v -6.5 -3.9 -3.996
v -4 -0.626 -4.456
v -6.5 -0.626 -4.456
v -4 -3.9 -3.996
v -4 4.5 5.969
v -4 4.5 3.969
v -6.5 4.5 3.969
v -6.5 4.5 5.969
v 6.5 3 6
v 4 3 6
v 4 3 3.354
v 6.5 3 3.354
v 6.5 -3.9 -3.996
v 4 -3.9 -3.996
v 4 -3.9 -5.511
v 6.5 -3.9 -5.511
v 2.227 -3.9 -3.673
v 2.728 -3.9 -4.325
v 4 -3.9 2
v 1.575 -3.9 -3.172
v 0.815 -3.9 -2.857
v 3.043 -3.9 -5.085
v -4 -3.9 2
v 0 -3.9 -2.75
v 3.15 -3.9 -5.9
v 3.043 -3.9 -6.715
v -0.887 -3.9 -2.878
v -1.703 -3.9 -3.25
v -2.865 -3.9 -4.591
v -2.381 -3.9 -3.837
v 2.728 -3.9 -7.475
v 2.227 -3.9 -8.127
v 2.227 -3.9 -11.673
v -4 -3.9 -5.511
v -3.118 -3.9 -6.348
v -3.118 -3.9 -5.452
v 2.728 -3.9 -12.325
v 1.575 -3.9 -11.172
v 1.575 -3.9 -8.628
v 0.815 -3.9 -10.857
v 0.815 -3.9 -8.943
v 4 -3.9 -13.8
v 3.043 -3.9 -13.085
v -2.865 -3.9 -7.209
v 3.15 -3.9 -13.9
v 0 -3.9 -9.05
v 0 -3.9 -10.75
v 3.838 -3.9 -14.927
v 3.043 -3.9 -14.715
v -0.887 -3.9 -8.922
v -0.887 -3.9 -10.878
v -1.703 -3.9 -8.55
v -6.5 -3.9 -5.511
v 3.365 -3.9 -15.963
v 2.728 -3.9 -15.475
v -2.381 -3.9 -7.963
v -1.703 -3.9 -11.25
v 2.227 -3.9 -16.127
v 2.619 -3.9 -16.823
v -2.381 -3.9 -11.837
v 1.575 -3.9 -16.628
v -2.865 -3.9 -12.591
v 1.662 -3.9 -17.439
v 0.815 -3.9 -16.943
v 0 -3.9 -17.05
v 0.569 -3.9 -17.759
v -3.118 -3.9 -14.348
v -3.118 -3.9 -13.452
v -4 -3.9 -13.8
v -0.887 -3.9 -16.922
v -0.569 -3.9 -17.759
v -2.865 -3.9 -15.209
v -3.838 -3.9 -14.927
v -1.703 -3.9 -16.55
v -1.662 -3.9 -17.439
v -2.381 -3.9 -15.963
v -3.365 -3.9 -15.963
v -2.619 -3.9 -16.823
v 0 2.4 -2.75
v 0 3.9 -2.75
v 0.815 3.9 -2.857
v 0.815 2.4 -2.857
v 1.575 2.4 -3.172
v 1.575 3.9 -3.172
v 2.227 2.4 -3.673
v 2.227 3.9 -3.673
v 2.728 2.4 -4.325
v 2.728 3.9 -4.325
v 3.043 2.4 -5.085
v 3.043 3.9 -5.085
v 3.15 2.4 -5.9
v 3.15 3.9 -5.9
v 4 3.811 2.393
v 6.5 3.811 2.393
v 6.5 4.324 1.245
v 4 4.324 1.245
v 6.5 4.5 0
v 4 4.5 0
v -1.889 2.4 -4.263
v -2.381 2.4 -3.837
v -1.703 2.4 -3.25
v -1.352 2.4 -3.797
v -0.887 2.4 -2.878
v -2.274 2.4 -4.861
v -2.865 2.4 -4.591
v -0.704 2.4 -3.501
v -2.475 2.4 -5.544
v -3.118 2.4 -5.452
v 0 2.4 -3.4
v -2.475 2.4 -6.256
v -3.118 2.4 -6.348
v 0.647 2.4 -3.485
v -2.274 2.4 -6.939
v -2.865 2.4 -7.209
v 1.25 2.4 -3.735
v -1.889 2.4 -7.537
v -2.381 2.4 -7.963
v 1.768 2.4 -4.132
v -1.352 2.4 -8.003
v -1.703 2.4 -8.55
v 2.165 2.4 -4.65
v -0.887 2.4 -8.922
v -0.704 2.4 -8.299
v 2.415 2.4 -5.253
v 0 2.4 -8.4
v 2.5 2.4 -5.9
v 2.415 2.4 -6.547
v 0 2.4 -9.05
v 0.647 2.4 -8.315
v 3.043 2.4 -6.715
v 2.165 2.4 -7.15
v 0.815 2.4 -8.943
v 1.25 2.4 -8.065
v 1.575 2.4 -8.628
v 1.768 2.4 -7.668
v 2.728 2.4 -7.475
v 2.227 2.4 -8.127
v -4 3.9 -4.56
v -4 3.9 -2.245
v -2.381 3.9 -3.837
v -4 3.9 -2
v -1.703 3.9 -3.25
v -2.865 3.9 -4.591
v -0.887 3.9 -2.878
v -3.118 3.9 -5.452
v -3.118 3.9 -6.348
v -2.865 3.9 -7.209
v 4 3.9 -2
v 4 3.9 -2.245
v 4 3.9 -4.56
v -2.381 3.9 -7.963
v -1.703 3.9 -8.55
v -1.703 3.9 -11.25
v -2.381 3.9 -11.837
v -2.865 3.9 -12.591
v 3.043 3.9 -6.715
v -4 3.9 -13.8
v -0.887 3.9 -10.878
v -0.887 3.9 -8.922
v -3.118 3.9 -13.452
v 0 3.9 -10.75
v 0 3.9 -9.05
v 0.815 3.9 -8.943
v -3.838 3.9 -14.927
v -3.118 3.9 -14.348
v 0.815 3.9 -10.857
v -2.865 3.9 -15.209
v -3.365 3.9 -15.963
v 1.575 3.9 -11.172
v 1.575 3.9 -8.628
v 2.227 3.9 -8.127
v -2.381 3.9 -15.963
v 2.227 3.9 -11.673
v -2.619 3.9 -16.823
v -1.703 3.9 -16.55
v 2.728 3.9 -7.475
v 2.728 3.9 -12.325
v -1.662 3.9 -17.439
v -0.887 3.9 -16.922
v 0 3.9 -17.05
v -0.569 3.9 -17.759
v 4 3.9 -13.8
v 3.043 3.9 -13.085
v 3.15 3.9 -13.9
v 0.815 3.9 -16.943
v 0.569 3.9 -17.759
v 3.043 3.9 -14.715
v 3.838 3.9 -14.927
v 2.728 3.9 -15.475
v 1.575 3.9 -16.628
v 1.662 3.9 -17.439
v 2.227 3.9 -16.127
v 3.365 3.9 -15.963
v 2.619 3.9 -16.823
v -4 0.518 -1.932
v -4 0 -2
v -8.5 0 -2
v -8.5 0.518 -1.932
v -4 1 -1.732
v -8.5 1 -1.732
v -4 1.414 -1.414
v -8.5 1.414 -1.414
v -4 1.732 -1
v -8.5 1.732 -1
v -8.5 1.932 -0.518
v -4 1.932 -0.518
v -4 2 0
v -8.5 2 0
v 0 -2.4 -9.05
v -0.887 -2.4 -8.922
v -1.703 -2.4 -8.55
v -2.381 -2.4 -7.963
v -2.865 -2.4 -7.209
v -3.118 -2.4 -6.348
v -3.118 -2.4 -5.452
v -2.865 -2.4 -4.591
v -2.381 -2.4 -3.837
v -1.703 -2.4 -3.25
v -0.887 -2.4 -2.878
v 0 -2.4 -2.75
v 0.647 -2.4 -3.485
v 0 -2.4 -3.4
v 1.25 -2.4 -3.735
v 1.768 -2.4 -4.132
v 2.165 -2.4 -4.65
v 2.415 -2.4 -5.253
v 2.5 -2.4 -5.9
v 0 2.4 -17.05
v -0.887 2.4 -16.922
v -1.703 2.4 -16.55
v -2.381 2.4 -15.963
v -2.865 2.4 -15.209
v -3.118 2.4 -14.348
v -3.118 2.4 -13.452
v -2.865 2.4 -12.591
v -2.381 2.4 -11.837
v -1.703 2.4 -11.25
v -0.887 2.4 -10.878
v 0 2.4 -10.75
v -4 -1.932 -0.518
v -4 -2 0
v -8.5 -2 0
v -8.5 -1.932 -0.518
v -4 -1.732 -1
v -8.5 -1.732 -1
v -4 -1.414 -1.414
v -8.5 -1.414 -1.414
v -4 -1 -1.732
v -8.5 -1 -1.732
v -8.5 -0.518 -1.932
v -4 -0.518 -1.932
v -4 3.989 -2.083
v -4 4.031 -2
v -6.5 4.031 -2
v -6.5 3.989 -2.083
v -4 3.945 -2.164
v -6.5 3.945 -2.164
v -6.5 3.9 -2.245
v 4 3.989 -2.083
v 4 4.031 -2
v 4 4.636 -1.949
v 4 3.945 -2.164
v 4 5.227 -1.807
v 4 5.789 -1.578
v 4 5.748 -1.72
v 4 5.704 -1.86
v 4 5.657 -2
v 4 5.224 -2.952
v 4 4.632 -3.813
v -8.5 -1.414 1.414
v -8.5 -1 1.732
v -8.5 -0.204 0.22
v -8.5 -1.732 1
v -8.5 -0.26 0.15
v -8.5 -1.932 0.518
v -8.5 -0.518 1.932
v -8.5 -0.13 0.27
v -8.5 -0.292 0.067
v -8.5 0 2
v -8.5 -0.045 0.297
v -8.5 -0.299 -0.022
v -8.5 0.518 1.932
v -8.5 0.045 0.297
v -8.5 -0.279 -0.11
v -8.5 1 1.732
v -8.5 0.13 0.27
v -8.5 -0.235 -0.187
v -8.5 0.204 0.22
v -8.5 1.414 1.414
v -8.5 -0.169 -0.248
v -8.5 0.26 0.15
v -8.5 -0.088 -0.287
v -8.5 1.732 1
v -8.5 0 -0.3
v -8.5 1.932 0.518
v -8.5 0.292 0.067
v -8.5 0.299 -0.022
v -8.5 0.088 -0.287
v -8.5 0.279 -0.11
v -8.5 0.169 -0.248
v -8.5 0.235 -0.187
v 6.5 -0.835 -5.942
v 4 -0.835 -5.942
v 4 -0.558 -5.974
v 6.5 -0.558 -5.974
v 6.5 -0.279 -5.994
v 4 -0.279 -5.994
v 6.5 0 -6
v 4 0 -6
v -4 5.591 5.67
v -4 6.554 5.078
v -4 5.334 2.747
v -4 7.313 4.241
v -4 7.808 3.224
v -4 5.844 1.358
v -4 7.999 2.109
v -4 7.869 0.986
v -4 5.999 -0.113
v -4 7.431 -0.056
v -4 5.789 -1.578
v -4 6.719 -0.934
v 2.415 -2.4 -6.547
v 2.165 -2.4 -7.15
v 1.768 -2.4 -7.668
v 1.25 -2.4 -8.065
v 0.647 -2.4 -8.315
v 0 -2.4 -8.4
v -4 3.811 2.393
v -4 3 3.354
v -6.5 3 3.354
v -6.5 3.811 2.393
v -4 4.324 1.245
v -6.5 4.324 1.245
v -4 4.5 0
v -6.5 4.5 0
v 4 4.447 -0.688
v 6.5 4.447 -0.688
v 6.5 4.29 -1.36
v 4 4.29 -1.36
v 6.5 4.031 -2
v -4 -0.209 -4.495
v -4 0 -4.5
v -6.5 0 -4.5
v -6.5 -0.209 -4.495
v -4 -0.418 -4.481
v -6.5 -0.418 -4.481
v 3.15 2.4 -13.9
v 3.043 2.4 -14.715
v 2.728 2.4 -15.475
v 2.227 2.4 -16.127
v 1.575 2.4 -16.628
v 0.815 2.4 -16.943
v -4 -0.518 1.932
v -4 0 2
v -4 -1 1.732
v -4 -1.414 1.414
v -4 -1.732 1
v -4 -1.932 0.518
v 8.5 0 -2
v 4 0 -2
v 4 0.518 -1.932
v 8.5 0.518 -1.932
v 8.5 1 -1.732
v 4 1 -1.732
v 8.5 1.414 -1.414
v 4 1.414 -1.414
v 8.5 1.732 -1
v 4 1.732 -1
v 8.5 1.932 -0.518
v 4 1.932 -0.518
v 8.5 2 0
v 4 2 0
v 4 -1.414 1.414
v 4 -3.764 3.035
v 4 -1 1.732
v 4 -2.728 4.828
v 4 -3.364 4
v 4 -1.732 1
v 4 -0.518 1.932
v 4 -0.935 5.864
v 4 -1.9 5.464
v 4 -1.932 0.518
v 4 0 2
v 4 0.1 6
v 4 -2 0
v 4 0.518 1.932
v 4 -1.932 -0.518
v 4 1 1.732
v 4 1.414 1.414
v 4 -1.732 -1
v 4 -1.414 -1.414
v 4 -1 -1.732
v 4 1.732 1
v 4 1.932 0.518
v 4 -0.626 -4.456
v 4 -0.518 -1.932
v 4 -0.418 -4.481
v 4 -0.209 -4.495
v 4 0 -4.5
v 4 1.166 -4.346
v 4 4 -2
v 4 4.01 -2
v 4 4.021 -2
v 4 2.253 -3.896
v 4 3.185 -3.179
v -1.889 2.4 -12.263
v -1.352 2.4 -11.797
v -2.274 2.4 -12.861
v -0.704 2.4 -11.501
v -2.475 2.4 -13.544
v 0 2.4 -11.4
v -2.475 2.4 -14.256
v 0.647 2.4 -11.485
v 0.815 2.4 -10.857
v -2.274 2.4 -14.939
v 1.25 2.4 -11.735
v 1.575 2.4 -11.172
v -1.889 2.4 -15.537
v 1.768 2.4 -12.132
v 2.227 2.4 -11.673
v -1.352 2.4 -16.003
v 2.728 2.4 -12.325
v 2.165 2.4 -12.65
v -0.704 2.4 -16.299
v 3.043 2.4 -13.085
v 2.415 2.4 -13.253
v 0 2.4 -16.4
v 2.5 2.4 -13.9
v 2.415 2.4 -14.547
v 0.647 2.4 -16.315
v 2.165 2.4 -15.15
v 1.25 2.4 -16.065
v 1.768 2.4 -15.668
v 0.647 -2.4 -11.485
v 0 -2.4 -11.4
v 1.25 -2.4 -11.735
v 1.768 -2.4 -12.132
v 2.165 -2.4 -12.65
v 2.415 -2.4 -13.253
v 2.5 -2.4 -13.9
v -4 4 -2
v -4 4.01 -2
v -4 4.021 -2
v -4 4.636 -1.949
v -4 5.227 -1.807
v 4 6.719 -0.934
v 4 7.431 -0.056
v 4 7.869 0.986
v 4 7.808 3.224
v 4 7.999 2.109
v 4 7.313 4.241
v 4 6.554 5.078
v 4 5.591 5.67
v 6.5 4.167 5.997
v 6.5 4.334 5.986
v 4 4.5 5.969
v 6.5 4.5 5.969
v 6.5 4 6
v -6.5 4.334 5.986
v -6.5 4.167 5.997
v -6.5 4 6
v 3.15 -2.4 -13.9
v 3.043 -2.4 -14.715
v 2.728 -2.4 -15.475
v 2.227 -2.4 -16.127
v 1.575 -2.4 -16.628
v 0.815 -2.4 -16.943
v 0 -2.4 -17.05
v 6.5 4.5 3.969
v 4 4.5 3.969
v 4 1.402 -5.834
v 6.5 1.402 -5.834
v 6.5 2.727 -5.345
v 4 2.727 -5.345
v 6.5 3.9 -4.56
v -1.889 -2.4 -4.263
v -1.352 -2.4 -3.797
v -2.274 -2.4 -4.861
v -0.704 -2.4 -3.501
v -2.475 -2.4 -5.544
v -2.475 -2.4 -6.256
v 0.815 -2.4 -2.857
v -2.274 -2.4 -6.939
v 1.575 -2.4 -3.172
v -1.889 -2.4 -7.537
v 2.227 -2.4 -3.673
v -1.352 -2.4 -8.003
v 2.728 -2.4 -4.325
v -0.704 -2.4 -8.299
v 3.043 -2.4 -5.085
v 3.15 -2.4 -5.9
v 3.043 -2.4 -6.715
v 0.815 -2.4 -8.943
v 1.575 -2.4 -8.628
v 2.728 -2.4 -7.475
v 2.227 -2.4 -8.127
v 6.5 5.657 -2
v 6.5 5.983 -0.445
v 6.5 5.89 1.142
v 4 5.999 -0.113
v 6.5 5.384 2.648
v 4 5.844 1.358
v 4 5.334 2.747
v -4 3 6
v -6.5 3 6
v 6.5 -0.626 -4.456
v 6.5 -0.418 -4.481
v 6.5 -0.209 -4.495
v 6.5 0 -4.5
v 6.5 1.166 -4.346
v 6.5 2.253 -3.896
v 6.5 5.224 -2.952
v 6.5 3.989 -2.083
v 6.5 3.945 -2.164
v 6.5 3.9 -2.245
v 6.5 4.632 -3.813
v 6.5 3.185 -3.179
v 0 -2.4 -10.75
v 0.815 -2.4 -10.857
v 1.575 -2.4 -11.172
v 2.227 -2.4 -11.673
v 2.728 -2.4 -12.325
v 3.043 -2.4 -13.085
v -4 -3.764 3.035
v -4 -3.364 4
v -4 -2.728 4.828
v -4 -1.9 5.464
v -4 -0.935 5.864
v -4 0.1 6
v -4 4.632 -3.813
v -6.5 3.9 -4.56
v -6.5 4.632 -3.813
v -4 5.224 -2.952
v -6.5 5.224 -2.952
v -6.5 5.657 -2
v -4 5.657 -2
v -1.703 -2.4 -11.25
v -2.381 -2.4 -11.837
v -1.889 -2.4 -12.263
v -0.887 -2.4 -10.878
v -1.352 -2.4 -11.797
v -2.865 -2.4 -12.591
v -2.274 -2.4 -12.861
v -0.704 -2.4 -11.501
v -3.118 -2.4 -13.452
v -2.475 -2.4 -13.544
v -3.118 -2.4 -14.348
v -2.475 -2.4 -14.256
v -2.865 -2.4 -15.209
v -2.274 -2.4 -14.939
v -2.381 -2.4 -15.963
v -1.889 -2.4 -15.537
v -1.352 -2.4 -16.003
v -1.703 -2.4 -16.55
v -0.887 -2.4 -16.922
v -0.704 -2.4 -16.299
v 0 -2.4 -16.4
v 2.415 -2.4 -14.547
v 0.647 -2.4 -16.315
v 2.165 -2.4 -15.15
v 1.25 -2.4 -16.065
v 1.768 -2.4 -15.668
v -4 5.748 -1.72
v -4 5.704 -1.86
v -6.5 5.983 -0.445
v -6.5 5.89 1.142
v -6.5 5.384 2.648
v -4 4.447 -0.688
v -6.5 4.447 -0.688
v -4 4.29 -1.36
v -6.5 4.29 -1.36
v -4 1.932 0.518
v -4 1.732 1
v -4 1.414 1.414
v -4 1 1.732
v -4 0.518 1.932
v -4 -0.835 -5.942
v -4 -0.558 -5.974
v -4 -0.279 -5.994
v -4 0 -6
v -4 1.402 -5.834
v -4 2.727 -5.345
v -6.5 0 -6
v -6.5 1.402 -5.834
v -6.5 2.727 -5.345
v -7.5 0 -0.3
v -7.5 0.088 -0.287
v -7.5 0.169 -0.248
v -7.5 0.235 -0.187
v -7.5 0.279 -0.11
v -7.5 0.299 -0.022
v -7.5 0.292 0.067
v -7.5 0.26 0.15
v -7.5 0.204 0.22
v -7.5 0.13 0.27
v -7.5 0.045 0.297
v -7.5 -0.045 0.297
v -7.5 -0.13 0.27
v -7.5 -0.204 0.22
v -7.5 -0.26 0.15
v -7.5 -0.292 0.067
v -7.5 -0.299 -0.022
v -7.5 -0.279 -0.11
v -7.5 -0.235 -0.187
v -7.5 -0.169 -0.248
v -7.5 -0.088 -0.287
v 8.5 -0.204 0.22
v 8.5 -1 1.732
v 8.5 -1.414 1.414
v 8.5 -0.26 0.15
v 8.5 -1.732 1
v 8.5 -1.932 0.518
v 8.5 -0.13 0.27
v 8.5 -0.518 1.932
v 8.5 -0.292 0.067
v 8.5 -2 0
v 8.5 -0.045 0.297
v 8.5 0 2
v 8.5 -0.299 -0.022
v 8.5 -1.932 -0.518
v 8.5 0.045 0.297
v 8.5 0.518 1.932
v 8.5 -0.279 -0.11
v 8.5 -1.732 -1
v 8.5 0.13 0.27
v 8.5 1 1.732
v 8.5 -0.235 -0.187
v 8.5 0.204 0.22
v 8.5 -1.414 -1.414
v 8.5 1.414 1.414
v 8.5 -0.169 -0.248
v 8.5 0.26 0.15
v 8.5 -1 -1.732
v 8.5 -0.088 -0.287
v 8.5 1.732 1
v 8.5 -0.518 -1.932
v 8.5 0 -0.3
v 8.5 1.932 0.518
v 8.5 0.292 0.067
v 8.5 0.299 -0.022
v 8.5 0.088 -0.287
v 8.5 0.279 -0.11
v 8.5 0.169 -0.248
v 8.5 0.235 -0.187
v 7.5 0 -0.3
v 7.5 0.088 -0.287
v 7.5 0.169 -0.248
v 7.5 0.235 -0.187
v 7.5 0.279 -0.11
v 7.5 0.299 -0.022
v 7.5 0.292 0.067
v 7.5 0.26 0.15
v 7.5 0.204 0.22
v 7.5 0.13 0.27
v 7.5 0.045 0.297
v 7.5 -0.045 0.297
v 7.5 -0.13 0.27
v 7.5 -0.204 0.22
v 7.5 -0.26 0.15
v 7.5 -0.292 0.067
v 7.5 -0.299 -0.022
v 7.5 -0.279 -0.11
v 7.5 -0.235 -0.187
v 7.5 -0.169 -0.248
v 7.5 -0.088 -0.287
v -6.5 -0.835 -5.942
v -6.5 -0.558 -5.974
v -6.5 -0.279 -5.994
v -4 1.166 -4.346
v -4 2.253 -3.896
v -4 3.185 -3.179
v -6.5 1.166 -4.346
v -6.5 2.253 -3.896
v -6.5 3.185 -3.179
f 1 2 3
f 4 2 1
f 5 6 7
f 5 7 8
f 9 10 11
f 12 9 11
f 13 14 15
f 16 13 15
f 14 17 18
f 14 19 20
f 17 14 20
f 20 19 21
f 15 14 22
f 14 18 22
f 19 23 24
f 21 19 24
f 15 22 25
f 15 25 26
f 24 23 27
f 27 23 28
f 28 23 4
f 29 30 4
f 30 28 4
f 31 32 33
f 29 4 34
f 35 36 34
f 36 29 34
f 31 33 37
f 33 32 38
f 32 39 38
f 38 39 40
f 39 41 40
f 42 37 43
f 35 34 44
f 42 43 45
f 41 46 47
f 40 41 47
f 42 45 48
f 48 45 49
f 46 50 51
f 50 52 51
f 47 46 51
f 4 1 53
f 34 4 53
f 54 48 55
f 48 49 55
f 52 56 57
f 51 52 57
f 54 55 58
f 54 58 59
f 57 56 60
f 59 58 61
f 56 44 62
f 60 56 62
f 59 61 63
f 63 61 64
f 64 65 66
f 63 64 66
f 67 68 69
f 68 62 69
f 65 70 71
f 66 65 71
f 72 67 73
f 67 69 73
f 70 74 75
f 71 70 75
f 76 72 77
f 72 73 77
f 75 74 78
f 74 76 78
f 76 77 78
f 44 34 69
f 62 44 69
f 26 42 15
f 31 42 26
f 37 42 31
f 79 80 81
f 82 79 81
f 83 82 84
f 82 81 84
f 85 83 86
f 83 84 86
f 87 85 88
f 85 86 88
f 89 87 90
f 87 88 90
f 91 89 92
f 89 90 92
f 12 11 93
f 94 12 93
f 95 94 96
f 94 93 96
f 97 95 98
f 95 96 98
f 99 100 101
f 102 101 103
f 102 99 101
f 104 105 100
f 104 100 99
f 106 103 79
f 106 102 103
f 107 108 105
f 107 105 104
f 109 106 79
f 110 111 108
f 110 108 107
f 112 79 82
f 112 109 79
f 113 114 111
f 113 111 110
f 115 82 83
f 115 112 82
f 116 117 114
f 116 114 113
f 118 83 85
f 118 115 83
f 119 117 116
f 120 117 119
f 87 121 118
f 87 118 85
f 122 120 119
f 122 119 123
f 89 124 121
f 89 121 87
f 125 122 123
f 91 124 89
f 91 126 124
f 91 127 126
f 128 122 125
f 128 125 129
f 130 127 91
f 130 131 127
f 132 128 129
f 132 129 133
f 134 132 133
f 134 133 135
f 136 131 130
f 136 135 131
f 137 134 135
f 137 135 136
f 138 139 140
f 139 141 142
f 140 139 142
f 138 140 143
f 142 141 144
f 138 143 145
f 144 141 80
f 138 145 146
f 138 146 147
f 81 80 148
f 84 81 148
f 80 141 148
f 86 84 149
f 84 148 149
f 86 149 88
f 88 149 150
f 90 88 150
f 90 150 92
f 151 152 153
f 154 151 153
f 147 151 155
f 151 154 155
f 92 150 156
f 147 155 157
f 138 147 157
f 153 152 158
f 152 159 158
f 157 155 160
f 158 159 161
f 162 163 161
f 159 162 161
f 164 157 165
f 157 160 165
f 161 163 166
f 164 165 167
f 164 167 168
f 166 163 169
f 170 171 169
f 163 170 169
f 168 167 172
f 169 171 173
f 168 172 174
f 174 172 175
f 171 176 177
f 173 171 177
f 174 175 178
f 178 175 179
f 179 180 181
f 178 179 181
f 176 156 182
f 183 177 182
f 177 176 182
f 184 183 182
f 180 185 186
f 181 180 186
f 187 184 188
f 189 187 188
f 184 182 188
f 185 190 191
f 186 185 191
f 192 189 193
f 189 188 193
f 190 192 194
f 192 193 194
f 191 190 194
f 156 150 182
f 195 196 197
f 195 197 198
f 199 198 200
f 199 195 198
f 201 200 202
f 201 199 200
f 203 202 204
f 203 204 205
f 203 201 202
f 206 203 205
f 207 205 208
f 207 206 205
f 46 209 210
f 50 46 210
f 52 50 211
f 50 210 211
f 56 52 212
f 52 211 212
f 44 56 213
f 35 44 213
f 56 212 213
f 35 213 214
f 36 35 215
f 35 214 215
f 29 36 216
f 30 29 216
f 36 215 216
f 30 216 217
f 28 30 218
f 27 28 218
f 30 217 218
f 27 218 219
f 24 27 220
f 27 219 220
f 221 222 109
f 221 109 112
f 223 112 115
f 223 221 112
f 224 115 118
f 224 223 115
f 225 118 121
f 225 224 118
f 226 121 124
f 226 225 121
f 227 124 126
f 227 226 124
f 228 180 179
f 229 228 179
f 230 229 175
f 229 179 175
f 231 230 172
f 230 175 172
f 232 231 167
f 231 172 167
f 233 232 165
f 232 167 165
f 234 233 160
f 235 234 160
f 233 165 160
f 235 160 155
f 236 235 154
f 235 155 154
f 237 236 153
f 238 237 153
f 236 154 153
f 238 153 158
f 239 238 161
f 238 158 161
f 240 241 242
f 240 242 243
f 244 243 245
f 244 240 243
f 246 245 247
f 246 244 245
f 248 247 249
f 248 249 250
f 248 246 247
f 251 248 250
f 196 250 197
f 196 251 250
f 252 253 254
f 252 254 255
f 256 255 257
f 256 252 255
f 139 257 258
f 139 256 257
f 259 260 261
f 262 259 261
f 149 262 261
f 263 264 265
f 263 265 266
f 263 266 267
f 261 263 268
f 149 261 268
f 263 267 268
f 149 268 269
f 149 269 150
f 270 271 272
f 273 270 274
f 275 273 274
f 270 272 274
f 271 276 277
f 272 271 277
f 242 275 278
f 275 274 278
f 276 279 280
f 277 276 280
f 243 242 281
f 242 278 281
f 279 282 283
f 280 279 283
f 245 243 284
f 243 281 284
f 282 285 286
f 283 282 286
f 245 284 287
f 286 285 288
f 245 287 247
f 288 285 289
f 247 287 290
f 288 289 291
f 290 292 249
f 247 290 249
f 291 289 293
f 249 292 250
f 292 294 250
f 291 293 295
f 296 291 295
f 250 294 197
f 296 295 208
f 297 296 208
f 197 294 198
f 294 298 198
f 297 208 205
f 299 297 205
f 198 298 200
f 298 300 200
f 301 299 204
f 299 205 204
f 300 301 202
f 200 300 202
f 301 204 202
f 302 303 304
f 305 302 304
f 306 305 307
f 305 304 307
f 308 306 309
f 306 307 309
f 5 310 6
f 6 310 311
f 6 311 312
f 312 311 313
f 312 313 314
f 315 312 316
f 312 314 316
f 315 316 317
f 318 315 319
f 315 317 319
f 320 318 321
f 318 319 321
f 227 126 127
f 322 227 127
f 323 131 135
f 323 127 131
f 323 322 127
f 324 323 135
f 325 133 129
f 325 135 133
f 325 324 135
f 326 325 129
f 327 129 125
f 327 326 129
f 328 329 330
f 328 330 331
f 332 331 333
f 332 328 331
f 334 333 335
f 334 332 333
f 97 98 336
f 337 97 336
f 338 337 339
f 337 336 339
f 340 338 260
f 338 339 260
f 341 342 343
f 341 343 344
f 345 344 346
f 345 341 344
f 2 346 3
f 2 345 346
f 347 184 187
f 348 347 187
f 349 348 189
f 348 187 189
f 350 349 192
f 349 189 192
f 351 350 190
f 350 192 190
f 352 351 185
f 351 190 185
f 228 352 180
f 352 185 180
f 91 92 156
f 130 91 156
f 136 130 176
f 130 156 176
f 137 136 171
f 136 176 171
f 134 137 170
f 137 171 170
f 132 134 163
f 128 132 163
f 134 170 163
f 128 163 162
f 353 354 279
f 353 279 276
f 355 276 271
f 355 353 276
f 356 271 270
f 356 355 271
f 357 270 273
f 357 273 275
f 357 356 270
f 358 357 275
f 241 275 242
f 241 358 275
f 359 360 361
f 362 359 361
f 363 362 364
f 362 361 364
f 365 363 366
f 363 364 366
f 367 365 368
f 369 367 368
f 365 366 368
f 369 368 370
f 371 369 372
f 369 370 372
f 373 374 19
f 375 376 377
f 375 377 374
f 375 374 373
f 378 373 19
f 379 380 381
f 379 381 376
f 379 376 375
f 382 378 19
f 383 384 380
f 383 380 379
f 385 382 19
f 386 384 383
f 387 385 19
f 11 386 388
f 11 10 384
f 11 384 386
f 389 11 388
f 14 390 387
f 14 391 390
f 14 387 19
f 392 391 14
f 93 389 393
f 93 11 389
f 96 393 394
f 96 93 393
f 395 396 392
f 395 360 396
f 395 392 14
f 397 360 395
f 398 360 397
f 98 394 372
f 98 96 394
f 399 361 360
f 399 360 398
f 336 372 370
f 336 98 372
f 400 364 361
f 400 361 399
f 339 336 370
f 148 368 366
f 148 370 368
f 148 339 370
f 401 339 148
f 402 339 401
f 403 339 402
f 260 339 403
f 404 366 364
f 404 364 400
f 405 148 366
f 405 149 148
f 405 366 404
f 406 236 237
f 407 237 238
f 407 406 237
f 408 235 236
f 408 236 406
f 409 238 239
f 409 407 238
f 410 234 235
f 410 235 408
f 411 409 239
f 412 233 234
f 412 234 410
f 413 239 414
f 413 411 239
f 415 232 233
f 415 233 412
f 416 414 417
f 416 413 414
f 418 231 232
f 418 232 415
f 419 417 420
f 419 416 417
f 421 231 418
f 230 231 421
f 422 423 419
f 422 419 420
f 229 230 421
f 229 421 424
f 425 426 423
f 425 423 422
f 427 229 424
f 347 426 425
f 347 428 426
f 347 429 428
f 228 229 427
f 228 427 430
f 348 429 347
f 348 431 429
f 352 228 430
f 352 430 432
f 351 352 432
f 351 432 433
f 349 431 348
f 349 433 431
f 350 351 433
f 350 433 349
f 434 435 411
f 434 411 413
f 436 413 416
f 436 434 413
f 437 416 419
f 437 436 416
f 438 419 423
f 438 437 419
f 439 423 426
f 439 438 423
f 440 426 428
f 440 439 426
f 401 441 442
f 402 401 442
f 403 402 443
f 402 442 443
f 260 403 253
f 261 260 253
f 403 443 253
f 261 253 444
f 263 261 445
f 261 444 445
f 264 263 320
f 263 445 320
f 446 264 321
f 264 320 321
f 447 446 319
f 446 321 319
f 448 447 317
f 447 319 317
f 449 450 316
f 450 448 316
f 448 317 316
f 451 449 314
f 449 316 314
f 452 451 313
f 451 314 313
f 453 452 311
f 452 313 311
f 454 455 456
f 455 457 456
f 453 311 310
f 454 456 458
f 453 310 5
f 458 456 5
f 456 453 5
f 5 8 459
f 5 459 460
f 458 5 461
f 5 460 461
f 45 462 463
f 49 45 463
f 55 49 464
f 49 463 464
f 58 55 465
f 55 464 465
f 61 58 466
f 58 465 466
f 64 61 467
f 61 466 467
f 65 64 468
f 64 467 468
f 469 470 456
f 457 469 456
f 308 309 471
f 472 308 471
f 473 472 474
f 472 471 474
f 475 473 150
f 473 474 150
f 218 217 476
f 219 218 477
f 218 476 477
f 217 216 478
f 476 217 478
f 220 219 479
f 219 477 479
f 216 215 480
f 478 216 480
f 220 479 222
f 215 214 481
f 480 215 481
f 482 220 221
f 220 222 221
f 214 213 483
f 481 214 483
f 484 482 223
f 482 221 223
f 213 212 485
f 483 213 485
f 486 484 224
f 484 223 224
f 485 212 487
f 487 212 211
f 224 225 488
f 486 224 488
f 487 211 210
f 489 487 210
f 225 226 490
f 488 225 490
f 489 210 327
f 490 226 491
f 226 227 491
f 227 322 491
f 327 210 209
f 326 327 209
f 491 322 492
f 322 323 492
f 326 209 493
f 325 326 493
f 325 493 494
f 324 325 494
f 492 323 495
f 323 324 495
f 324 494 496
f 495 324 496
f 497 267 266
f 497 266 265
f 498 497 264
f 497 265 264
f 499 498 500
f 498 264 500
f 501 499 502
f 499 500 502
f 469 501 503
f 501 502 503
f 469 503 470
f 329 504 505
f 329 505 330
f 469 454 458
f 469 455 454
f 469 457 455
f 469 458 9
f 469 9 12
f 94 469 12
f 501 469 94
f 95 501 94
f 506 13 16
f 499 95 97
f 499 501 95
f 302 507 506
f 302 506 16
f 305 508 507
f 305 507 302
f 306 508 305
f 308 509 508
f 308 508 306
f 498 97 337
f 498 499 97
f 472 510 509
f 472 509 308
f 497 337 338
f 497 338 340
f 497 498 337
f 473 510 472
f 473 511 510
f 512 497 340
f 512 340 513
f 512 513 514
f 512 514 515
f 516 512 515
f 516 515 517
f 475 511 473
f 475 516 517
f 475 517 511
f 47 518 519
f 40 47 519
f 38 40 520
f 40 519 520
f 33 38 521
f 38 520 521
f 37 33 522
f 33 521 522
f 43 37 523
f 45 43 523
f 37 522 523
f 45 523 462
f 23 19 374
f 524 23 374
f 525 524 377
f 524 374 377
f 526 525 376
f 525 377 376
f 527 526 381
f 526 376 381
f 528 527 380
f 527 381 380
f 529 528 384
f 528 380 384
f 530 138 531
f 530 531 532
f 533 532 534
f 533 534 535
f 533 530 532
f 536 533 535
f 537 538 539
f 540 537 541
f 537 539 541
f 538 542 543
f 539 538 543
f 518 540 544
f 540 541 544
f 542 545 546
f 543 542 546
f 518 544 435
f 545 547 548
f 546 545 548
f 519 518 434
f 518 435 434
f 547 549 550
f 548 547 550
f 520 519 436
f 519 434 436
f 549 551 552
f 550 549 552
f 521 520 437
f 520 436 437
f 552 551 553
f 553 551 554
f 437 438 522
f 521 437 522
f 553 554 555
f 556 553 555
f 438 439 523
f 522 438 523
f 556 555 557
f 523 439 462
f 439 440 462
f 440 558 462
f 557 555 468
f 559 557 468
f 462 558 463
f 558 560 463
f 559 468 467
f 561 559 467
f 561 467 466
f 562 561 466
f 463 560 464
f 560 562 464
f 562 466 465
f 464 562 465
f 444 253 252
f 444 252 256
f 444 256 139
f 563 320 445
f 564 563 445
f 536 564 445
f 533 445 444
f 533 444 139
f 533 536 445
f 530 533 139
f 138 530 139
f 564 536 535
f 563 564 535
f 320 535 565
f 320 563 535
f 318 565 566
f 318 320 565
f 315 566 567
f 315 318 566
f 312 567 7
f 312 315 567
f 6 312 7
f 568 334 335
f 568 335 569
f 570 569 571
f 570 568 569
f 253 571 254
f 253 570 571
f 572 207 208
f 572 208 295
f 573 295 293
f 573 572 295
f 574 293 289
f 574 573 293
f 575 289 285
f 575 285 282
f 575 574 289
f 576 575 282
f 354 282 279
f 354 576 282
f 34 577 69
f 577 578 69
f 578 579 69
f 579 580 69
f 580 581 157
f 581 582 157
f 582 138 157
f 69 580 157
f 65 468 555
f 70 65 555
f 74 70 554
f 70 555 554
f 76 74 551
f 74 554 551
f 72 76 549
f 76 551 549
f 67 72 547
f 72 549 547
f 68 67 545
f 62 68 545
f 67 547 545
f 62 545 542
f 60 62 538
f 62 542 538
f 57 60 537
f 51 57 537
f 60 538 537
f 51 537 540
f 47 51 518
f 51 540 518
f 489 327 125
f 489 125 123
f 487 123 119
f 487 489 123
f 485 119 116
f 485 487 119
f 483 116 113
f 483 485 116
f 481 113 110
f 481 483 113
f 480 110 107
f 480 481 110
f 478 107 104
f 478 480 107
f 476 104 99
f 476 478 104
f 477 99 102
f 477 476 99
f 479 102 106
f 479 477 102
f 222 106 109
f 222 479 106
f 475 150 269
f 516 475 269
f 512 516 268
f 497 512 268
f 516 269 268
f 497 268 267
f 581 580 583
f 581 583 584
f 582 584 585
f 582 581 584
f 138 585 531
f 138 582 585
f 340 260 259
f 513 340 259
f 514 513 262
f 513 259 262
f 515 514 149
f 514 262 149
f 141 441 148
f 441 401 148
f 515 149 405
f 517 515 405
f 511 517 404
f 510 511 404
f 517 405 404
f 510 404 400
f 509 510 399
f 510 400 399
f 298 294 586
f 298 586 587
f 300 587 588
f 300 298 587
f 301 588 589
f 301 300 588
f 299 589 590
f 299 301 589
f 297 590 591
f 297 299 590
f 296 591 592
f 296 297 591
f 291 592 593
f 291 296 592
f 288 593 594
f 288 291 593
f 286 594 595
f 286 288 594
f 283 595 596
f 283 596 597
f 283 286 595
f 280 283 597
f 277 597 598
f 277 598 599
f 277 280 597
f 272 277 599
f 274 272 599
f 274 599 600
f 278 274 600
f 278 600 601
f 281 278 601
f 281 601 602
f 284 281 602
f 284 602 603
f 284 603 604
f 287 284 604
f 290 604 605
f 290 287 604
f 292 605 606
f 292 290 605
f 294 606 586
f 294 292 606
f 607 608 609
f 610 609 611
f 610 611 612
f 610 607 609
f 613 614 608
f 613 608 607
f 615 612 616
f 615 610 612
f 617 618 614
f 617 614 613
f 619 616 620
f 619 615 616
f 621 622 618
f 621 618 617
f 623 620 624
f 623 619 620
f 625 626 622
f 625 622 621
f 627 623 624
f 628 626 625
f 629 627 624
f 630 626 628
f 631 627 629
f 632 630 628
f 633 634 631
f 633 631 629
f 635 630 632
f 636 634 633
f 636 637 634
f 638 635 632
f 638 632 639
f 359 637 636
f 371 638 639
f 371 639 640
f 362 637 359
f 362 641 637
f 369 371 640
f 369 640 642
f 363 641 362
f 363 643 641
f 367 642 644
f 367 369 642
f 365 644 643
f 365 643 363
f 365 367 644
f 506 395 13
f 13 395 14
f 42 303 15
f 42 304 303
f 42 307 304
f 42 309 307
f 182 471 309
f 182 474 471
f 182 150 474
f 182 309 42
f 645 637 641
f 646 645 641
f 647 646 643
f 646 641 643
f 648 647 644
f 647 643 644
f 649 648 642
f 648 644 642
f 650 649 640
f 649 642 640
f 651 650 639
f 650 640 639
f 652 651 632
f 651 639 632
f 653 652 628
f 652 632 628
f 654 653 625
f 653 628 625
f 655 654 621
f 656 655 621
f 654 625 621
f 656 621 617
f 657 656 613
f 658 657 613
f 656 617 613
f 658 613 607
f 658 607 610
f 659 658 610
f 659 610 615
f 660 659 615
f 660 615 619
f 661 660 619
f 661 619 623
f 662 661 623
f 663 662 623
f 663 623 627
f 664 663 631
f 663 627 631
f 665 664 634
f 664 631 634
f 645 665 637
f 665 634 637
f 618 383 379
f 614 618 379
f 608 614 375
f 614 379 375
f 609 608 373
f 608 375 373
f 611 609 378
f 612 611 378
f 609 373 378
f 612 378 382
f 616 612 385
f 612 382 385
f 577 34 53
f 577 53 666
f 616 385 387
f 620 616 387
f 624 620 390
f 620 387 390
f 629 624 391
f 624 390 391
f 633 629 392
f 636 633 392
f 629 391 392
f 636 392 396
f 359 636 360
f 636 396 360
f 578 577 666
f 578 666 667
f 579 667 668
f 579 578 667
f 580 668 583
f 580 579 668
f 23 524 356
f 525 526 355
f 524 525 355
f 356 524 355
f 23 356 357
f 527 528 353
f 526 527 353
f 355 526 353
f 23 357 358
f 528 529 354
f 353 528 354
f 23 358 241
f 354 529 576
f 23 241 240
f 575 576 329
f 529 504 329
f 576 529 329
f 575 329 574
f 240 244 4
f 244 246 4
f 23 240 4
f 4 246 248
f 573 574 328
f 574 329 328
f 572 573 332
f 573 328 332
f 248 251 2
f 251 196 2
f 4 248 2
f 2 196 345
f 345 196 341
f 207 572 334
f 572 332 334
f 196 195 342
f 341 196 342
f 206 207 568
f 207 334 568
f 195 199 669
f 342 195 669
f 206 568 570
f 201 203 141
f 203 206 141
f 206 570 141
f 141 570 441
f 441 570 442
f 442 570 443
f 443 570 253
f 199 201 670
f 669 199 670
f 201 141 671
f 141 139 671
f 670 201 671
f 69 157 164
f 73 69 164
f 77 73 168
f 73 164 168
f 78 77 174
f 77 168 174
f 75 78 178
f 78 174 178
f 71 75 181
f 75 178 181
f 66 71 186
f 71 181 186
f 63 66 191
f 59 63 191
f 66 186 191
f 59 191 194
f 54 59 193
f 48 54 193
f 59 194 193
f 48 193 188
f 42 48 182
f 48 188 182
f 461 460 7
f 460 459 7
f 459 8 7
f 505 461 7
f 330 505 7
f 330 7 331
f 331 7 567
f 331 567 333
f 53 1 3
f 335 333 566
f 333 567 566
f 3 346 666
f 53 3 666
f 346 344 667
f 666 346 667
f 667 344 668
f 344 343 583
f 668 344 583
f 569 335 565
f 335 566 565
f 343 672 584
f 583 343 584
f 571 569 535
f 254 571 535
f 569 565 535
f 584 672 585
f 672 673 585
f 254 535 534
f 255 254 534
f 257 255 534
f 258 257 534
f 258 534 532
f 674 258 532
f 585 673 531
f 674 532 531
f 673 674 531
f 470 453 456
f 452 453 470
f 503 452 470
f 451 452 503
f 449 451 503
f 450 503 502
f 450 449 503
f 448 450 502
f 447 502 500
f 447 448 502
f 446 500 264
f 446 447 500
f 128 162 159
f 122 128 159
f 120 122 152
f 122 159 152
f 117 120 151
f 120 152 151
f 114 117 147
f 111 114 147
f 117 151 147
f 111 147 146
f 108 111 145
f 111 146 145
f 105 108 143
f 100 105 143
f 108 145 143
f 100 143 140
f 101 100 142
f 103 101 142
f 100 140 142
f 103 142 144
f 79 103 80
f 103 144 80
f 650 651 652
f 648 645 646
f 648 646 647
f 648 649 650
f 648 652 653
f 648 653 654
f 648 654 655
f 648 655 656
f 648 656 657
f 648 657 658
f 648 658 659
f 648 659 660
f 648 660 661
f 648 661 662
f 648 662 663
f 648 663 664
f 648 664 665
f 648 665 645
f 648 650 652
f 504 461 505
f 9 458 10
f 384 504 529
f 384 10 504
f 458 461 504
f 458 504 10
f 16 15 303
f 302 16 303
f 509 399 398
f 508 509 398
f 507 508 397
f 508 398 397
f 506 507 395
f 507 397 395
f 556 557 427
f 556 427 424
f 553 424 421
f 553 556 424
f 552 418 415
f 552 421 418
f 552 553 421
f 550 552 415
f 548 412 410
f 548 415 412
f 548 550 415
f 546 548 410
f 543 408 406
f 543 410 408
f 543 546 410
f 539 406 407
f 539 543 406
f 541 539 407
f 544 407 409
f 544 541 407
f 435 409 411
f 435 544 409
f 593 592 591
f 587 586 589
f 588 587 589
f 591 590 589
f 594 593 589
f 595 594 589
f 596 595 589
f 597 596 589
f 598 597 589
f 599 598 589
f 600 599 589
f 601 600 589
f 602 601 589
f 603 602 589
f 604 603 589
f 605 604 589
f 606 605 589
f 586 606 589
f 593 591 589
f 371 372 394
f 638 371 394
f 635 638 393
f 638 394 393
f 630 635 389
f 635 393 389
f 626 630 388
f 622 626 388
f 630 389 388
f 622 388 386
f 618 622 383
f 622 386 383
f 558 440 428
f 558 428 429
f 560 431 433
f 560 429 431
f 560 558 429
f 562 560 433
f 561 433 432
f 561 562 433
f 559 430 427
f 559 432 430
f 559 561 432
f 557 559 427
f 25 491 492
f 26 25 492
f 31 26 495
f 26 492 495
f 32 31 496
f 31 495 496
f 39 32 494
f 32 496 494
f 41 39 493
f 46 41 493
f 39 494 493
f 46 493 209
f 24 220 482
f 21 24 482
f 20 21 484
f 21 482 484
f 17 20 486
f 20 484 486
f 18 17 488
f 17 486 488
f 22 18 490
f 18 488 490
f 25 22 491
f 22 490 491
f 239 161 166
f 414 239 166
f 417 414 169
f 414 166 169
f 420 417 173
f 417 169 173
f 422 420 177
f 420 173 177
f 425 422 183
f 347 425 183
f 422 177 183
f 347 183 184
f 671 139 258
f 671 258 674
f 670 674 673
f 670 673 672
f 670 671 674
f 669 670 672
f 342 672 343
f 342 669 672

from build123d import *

# Parameters (mm, degrees)
SKETCH_2_W               = 23.8
SKETCH_2_H               = 16
EXTRUDE_1_DEPTH          = 4
EXTRUDE_START            = 4
EXTRUDE_3_DEPTH          = 4.5
SKETCH_5_R               = 0.3
CUT_EXTRUDE_10_DEPTH     = 1
CUT_EXTRUDE_5_DEPTH      = 22.285910833
EXTRUDE_2_DEPTH          = 2.5
CUT_EXTRUDE_6_DEPTH      = 24.036926878
CUT_EXTRUDE_6_DEPTH_BACK = 24.036926878
CUT_EXTRUDE_7_DEPTH      = 1.5
CUT_EXTRUDE_START        = -6.3
CUT_EXTRUDE_8_DEPTH      = 1.5
CUT_EXTRUDE_9_DEPTH      = 22.285910833
CUT_EXTRUDE_9_DEPTH_BACK = 22.285910833
SKETCH_4_W               = 11.51085618
SKETCH_4_H               = 4.1
FILLET_1_R               = 4


with BuildPart() as part:
    # 草图2 → 凸台-拉伸1 (new body)
    with BuildSketch(Plane(origin=(0, 0, 0), x_dir=(0, 0, -1), z_dir=(1, 0, 0))):
        with Locations((5.9, 0)):
            Rectangle(SKETCH_2_W, SKETCH_2_H)
    extrude(amount=EXTRUDE_1_DEPTH)

    # 草图2<10> → 凸台-拉伸3 (add)
    with BuildSketch(Plane(origin=(0, 0, 0), x_dir=(0, 0, -1), z_dir=(1, 0, 0)).offset(EXTRUDE_START)):
        with BuildLine():
            ThreePointArc((0, -2), (1.414213562, -1.414213562), (2, 0))
            Line((2, 0), (0, 0))
            Line((0, 0), (0, -2))
        make_face()
        with BuildLine():
            Line((0, 0), (2, 0))
            ThreePointArc((2, 0), (1.414213562, 1.414213562), (0, 2))
            Line((0, 2), (0, 0))
        make_face()
        with BuildLine():
            Line((0, -2), (0, 0))
            Line((0, 0), (-2, 0))
            ThreePointArc((-2, 0), (-1.414213562, -1.414213562), (0, -2))
        make_face()
        with BuildLine():
            Line((-2, 0), (0, 0))
            Line((0, 0), (0, 2))
            ThreePointArc((0, 2), (-1.414213562, 1.414213562), (-2, 0))
        make_face()
    extrude(amount=EXTRUDE_3_DEPTH)

    # 草图5 → 切除-拉伸10 (cut)
    with BuildSketch(Plane(origin=(8.5, 0, 0), x_dir=(0, 0, -1), z_dir=(1, 0, 0))):
        Circle(SKETCH_5_R)
    extrude(amount=-CUT_EXTRUDE_10_DEPTH, mode=Mode.SUBTRACT)

    # 草图2<9> → 切除-拉伸5 (cut, through all)
    with BuildSketch(Plane(origin=(0, 0, 0), x_dir=(0, 0, -1), z_dir=(1, 0, 0))):
        with BuildLine():
            ThreePointArc((2.244994432, 3.9), (2.123509625, 3.96745597), (2, 4.031128874))
            Line((2, 4.031128874), (2, 3.9))
            Line((2, 3.9), (2.244994432, 3.9))
        make_face()
        with BuildLine():
            ThreePointArc((4.559605246, 3.9), (3.39539975, 4.946843493), (2, 5.656854249))
            Line((2, 5.656854249), (2, 4.031128874))
            ThreePointArc((2, 4.031128874), (2.123509625, 3.96745597), (2.244994432, 3.9))
            Line((2.244994432, 3.9), (4.559605246, 3.9))
        make_face()
        with BuildLine():
            Line((17.8, 8), (2, 8))
            Line((2, 8), (2, 5.656854249))
            ThreePointArc((2, 5.656854249), (3.39539975, 4.946843493), (4.559605246, 3.9))
            Line((4.559605246, 3.9), (17.8, 3.9))
            Line((17.8, 3.9), (17.8, 8))
        make_face()
        with BuildLine():
            Line((2, -4.031128874), (2, -5.656854249))
            ThreePointArc((2, -5.656854249), (3.002792751, -5.194539026), (3.903880188, -4.556283516))
            Line((3.903880188, -4.556283516), (3.996114821, -3.9))
            Line((3.996114821, -3.9), (2.244994432, -3.9))
            ThreePointArc((2.244994432, -3.9), (2.123509625, -3.96745597), (2, -4.031128874))
        make_face()
        with BuildLine():
            ThreePointArc((3.903880188, -4.556283516), (3.002792751, -5.194539026), (2, -5.656854249))
            Line((2, -5.656854249), (2, -8))
            Line((2, -8), (3.419897399, -8))
            Line((3.419897399, -8), (3.903880188, -4.556283516))
        make_face()
        with BuildLine():
            ThreePointArc((3.903880188, -4.556283516), (4.244446187, -4.240834418), (4.559605246, -3.9))
            Line((4.559605246, -3.9), (3.996114821, -3.9))
            Line((3.996114821, -3.9), (3.903880188, -4.556283516))
        make_face()
        with BuildLine():
            Line((4.934638757, -8), (5.51085618, -3.9))
            Line((5.51085618, -3.9), (4.559605246, -3.9))
            ThreePointArc((4.559605246, -3.9), (4.244446187, -4.240834418), (3.903880188, -4.556283516))
            Line((3.903880188, -4.556283516), (3.419897399, -8))
            Line((3.419897399, -8), (4.934638757, -8))
        make_face()
        Polygon((17.8, -8), (17.8, -3.9), (5.51085618, -3.9), (4.934638757, -8), align=None)
    extrude(amount=CUT_EXTRUDE_5_DEPTH, mode=Mode.SUBTRACT)

    # 草图2<4> → 凸台-拉伸2 (add)
    with BuildSketch(Plane(origin=(0, 0, 0), x_dir=(0, 0, -1), z_dir=(1, 0, 0)).offset(EXTRUDE_START)):
        with BuildLine():
            Line((4.934638757, -8), (5.51085618, -3.9))
            Line((5.51085618, -3.9), (4.559605246, -3.9))
            ThreePointArc((4.559605246, -3.9), (4.244446187, -4.240834418), (3.903880188, -4.556283516))
            Line((3.903880188, -4.556283516), (3.419897399, -8))
            Line((3.419897399, -8), (4.934638757, -8))
        make_face()
        with BuildLine():
            Line((4.559605246, -3.9), (3.996114821, -3.9))
            Line((3.996114821, -3.9), (3.903880188, -4.556283516))
            ThreePointArc((3.903880188, -4.556283516), (4.244446187, -4.240834418), (4.559605246, -3.9))
        make_face()
        with BuildLine():
            Line((6, 0), (4.5, 0))
            ThreePointArc((4.5, 0), (4.489038226, -0.313904132), (4.456206309, -0.626278954))
            Line((4.456206309, -0.626278954), (3.996114821, -3.9))
            Line((3.996114821, -3.9), (4.559605246, -3.9))
            ThreePointArc((4.559605246, -3.9), (5.469677245, -2.466299016), (5.941608412, -0.835038606))
            ThreePointArc((5.941608412, -0.835038606), (5.985384302, -0.418538842), (6, 0))
        make_face()
        with BuildLine():
            Line((5.51085618, -3.9), (5.941608412, -0.835038606))
            ThreePointArc((5.941608412, -0.835038606), (5.469677245, -2.466299016), (4.559605246, -3.9))
            Line((4.559605246, -3.9), (5.51085618, -3.9))
        make_face()
        with BuildLine():
            ThreePointArc((2.244994432, 3.9), (3.895669066, 2.252501394), (4.5, 0))
            Line((4.5, 0), (6, 0))
            ThreePointArc((6, 0), (5.628393709, 2.078745839), (4.559605246, 3.9))
            Line((4.559605246, 3.9), (2.244994432, 3.9))
        make_face()
        with BuildLine():
            ThreePointArc((2, 4.031128874), (2.123509625, 3.96745597), (2.244994432, 3.9))
            Line((2.244994432, 3.9), (4.559605246, 3.9))
            ThreePointArc((4.559605246, 3.9), (3.39539975, 4.946843493), (2, 5.656854249))
            Line((2, 5.656854249), (2, 4.031128874))
        make_face()
        with BuildLine():
            ThreePointArc((0, 4.5), (1.027112473, 4.38121444), (2, 4.031128874))
            Line((2, 4.031128874), (2, 5.656854249))
            ThreePointArc((2, 5.656854249), (-1.141687773, 5.890377664), (-3.968626967, 4.5))
            Line((-3.968626967, 4.5), (0, 4.5))
        make_face()
        with BuildLine():
            ThreePointArc((-3.354101966, 3), (-1.837117307, 4.107919181), (0, 4.5))
            Line((0, 4.5), (-3.968626967, 4.5))
            ThreePointArc((-3.968626967, 4.5), (-4.643360347, 3.799895352), (-5.196152423, 3))
            Line((-5.196152423, 3), (-3.354101966, 3))
        make_face()
        with BuildLine():
            ThreePointArc((-5.196152423, 3), (-4.643360347, 3.799895352), (-3.968626967, 4.5))
            Line((-3.968626967, 4.5), (-6, 4.5))
            Line((-6, 4.5), (-6, 3))
            Line((-6, 3), (-5.196152423, 3))
        make_face()
    extrude(amount=EXTRUDE_2_DEPTH)

    # 镜向1: part across plane


with BuildPart() as part_1:
    add(part.part)
    add(part.part.mirror(Plane(origin=(0, 0, 0), x_dir=(0, 0, 1), z_dir=(1, 0, 0))))

    # 草图3 → 切除-拉伸6 (cut, two sides: drawn at the far end of the back side and taken through both)
    with BuildSketch(Plane(origin=(0, 3.9, 0), x_dir=(1, 0, 0), z_dir=(0, 1, 0)).offset(-CUT_EXTRUDE_6_DEPTH_BACK)):
        with BuildLine():
            ThreePointArc((2.5, 13.9), (1.767766953, 15.667766953), (0, 16.4))
            Line((0, 16.4), (0, 11.4))
            ThreePointArc((0, 11.4), (1.767766953, 12.132233047), (2.5, 13.9))
        make_face()
        with BuildLine():
            Line((0, 11.4), (0, 16.4))
            ThreePointArc((0, 16.4), (-2.5, 13.9), (0, 11.4))
        make_face()
        with BuildLine():
            ThreePointArc((2.5, 5.9), (1.767766953, 7.667766953), (0, 8.4))
            Line((0, 8.4), (0, 3.4))
            ThreePointArc((0, 3.4), (1.767766953, 4.132233047), (2.5, 5.9))
        make_face()
        with BuildLine():
            Line((0, 3.4), (0, 8.4))
            ThreePointArc((0, 8.4), (-2.5, 5.9), (0, 3.4))
        make_face()
    extrude(amount=CUT_EXTRUDE_6_DEPTH + CUT_EXTRUDE_6_DEPTH_BACK, mode=Mode.SUBTRACT)

    # 草图3<4> → 切除-拉伸7 (cut)
    with BuildSketch(Plane(origin=(0, 3.9, 0), x_dir=(1, 0, 0), z_dir=(0, 1, 0))):
        with BuildLine():
            ThreePointArc((3.15, 5.9), (2.227386361, 8.127386361), (0, 9.05))
            Line((0, 9.05), (0, 8.4))
            ThreePointArc((0, 8.4), (1.767766953, 7.667766953), (2.5, 5.9))
            ThreePointArc((2.5, 5.9), (1.767766953, 4.132233047), (0, 3.4))
            Line((0, 3.4), (0, 2.75))
            ThreePointArc((0, 2.75), (2.227386361, 3.672613639), (3.15, 5.9))
        make_face()
        with BuildLine():
            Line((0, 8.4), (0, 9.05))
            ThreePointArc((0, 9.05), (-3.15, 5.9), (0, 2.75))
            Line((0, 2.75), (0, 3.4))
            ThreePointArc((0, 3.4), (-2.5, 5.9), (0, 8.4))
        make_face()
        with BuildLine():
            ThreePointArc((3.15, 13.9), (2.227386361, 16.127386361), (0, 17.05))
            Line((0, 17.05), (0, 16.4))
            ThreePointArc((0, 16.4), (1.767766953, 15.667766953), (2.5, 13.9))
            ThreePointArc((2.5, 13.9), (1.767766953, 12.132233047), (0, 11.4))
            Line((0, 11.4), (0, 10.75))
            ThreePointArc((0, 10.75), (2.227386361, 11.672613639), (3.15, 13.9))
        make_face()
        with BuildLine():
            Line((0, 16.4), (0, 17.05))
            ThreePointArc((0, 17.05), (-3.15, 13.9), (0, 10.75))
            Line((0, 10.75), (0, 11.4))
            ThreePointArc((0, 11.4), (-2.5, 13.9), (0, 16.4))
        make_face()
    extrude(amount=-CUT_EXTRUDE_7_DEPTH, mode=Mode.SUBTRACT)

    # 草图3<5> → 切除-拉伸8 (cut)
    with BuildSketch(Plane(origin=(0, 3.9, 0), x_dir=(1, 0, 0), z_dir=(0, 1, 0)).offset(CUT_EXTRUDE_START)):
        with BuildLine():
            ThreePointArc((3.15, 5.9), (2.227386361, 8.127386361), (0, 9.05))
            Line((0, 9.05), (0, 8.4))
            ThreePointArc((0, 8.4), (1.767766953, 7.667766953), (2.5, 5.9))
            ThreePointArc((2.5, 5.9), (1.767766953, 4.132233047), (0, 3.4))
            Line((0, 3.4), (0, 2.75))
            ThreePointArc((0, 2.75), (2.227386361, 3.672613639), (3.15, 5.9))
        make_face()
        with BuildLine():
            Line((0, 8.4), (0, 9.05))
            ThreePointArc((0, 9.05), (-3.15, 5.9), (0, 2.75))
            Line((0, 2.75), (0, 3.4))
            ThreePointArc((0, 3.4), (-2.5, 5.9), (0, 8.4))
        make_face()
        with BuildLine():
            ThreePointArc((3.15, 13.9), (2.227386361, 16.127386361), (0, 17.05))
            Line((0, 17.05), (0, 16.4))
            ThreePointArc((0, 16.4), (1.767766953, 15.667766953), (2.5, 13.9))
            ThreePointArc((2.5, 13.9), (1.767766953, 12.132233047), (0, 11.4))
            Line((0, 11.4), (0, 10.75))
            ThreePointArc((0, 10.75), (2.227386361, 11.672613639), (3.15, 13.9))
        make_face()
        with BuildLine():
            Line((0, 16.4), (0, 17.05))
            ThreePointArc((0, 17.05), (-3.15, 13.9), (0, 10.75))
            Line((0, 10.75), (0, 11.4))
            ThreePointArc((0, 11.4), (-2.5, 13.9), (0, 16.4))
        make_face()
    extrude(amount=-CUT_EXTRUDE_8_DEPTH, mode=Mode.SUBTRACT)

    # 草图4 → 切除-拉伸9 (cut, two sides: drawn at the far end of the back side and taken through both)
    with BuildSketch(Plane(origin=(0, 0, 0), x_dir=(0, 0, -1), z_dir=(1, 0, 0)).offset(-CUT_EXTRUDE_9_DEPTH_BACK)):
        with Locations((-0.24457191, -5.95)):
            Rectangle(SKETCH_4_W, SKETCH_4_H)
    extrude(amount=CUT_EXTRUDE_9_DEPTH + CUT_EXTRUDE_9_DEPTH_BACK, mode=Mode.SUBTRACT)

    # 圆角1
    # the kernel refuses this fillet: 4 mm, written as the material it takes off along each edge
    with BuildSketch(Plane(origin=(-4, 13.9, -17.8), x_dir=(1, 0, 0), z_dir=(0, -1, 0))) as fillet_1_piece_1:
        with BuildLine():
            CenterArc((FILLET_1_R, FILLET_1_R), FILLET_1_R, 180, 90)
            Line((0, FILLET_1_R), (0, 0))
            Line((0, 0), (FILLET_1_R, 0))
        make_face()
    extrude(amount=27.8, mode=Mode.SUBTRACT)
    with BuildSketch(Plane(origin=(14, -3.9, 6), x_dir=(0, 0, -1), z_dir=(-1, 0, 0)), Plane(origin=(-14, 8, 6), x_dir=(0, 0, -1), z_dir=(1, 0, 0))) as fillet_1_piece_2:
        with BuildLine():
            CenterArc((FILLET_1_R, -FILLET_1_R), FILLET_1_R, 90, 90)
            Line((0, -FILLET_1_R), (0, 0))
            Line((0, 0), (FILLET_1_R, 0))
        make_face()
    extrude(amount=28, mode=Mode.SUBTRACT)
    with BuildSketch(Plane(origin=(4, 13.9, -17.8), x_dir=(-1, 0, 0), z_dir=(0, -1, 0))) as fillet_1_piece_3:
        with BuildLine():
            CenterArc((FILLET_1_R, -FILLET_1_R), FILLET_1_R, 90, 90)
            Line((0, -FILLET_1_R), (0, 0))
            Line((0, 0), (FILLET_1_R, 0))
        make_face()
    extrude(amount=27.8, mode=Mode.SUBTRACT)
    with BuildSketch(Plane(origin=(4, 8, -2), x_dir=(0, 0, 1), z_dir=(-1, 0, 0))) as fillet_1_piece_4:
        with BuildLine():
            CenterArc((FILLET_1_R, -FILLET_1_R), FILLET_1_R, 90, 90)
            Line((0, -FILLET_1_R), (0, 0))
            Line((0, 0), (FILLET_1_R, 0))
        make_face()
    extrude(amount=8, mode=Mode.SUBTRACT)


solid = part_1.part
